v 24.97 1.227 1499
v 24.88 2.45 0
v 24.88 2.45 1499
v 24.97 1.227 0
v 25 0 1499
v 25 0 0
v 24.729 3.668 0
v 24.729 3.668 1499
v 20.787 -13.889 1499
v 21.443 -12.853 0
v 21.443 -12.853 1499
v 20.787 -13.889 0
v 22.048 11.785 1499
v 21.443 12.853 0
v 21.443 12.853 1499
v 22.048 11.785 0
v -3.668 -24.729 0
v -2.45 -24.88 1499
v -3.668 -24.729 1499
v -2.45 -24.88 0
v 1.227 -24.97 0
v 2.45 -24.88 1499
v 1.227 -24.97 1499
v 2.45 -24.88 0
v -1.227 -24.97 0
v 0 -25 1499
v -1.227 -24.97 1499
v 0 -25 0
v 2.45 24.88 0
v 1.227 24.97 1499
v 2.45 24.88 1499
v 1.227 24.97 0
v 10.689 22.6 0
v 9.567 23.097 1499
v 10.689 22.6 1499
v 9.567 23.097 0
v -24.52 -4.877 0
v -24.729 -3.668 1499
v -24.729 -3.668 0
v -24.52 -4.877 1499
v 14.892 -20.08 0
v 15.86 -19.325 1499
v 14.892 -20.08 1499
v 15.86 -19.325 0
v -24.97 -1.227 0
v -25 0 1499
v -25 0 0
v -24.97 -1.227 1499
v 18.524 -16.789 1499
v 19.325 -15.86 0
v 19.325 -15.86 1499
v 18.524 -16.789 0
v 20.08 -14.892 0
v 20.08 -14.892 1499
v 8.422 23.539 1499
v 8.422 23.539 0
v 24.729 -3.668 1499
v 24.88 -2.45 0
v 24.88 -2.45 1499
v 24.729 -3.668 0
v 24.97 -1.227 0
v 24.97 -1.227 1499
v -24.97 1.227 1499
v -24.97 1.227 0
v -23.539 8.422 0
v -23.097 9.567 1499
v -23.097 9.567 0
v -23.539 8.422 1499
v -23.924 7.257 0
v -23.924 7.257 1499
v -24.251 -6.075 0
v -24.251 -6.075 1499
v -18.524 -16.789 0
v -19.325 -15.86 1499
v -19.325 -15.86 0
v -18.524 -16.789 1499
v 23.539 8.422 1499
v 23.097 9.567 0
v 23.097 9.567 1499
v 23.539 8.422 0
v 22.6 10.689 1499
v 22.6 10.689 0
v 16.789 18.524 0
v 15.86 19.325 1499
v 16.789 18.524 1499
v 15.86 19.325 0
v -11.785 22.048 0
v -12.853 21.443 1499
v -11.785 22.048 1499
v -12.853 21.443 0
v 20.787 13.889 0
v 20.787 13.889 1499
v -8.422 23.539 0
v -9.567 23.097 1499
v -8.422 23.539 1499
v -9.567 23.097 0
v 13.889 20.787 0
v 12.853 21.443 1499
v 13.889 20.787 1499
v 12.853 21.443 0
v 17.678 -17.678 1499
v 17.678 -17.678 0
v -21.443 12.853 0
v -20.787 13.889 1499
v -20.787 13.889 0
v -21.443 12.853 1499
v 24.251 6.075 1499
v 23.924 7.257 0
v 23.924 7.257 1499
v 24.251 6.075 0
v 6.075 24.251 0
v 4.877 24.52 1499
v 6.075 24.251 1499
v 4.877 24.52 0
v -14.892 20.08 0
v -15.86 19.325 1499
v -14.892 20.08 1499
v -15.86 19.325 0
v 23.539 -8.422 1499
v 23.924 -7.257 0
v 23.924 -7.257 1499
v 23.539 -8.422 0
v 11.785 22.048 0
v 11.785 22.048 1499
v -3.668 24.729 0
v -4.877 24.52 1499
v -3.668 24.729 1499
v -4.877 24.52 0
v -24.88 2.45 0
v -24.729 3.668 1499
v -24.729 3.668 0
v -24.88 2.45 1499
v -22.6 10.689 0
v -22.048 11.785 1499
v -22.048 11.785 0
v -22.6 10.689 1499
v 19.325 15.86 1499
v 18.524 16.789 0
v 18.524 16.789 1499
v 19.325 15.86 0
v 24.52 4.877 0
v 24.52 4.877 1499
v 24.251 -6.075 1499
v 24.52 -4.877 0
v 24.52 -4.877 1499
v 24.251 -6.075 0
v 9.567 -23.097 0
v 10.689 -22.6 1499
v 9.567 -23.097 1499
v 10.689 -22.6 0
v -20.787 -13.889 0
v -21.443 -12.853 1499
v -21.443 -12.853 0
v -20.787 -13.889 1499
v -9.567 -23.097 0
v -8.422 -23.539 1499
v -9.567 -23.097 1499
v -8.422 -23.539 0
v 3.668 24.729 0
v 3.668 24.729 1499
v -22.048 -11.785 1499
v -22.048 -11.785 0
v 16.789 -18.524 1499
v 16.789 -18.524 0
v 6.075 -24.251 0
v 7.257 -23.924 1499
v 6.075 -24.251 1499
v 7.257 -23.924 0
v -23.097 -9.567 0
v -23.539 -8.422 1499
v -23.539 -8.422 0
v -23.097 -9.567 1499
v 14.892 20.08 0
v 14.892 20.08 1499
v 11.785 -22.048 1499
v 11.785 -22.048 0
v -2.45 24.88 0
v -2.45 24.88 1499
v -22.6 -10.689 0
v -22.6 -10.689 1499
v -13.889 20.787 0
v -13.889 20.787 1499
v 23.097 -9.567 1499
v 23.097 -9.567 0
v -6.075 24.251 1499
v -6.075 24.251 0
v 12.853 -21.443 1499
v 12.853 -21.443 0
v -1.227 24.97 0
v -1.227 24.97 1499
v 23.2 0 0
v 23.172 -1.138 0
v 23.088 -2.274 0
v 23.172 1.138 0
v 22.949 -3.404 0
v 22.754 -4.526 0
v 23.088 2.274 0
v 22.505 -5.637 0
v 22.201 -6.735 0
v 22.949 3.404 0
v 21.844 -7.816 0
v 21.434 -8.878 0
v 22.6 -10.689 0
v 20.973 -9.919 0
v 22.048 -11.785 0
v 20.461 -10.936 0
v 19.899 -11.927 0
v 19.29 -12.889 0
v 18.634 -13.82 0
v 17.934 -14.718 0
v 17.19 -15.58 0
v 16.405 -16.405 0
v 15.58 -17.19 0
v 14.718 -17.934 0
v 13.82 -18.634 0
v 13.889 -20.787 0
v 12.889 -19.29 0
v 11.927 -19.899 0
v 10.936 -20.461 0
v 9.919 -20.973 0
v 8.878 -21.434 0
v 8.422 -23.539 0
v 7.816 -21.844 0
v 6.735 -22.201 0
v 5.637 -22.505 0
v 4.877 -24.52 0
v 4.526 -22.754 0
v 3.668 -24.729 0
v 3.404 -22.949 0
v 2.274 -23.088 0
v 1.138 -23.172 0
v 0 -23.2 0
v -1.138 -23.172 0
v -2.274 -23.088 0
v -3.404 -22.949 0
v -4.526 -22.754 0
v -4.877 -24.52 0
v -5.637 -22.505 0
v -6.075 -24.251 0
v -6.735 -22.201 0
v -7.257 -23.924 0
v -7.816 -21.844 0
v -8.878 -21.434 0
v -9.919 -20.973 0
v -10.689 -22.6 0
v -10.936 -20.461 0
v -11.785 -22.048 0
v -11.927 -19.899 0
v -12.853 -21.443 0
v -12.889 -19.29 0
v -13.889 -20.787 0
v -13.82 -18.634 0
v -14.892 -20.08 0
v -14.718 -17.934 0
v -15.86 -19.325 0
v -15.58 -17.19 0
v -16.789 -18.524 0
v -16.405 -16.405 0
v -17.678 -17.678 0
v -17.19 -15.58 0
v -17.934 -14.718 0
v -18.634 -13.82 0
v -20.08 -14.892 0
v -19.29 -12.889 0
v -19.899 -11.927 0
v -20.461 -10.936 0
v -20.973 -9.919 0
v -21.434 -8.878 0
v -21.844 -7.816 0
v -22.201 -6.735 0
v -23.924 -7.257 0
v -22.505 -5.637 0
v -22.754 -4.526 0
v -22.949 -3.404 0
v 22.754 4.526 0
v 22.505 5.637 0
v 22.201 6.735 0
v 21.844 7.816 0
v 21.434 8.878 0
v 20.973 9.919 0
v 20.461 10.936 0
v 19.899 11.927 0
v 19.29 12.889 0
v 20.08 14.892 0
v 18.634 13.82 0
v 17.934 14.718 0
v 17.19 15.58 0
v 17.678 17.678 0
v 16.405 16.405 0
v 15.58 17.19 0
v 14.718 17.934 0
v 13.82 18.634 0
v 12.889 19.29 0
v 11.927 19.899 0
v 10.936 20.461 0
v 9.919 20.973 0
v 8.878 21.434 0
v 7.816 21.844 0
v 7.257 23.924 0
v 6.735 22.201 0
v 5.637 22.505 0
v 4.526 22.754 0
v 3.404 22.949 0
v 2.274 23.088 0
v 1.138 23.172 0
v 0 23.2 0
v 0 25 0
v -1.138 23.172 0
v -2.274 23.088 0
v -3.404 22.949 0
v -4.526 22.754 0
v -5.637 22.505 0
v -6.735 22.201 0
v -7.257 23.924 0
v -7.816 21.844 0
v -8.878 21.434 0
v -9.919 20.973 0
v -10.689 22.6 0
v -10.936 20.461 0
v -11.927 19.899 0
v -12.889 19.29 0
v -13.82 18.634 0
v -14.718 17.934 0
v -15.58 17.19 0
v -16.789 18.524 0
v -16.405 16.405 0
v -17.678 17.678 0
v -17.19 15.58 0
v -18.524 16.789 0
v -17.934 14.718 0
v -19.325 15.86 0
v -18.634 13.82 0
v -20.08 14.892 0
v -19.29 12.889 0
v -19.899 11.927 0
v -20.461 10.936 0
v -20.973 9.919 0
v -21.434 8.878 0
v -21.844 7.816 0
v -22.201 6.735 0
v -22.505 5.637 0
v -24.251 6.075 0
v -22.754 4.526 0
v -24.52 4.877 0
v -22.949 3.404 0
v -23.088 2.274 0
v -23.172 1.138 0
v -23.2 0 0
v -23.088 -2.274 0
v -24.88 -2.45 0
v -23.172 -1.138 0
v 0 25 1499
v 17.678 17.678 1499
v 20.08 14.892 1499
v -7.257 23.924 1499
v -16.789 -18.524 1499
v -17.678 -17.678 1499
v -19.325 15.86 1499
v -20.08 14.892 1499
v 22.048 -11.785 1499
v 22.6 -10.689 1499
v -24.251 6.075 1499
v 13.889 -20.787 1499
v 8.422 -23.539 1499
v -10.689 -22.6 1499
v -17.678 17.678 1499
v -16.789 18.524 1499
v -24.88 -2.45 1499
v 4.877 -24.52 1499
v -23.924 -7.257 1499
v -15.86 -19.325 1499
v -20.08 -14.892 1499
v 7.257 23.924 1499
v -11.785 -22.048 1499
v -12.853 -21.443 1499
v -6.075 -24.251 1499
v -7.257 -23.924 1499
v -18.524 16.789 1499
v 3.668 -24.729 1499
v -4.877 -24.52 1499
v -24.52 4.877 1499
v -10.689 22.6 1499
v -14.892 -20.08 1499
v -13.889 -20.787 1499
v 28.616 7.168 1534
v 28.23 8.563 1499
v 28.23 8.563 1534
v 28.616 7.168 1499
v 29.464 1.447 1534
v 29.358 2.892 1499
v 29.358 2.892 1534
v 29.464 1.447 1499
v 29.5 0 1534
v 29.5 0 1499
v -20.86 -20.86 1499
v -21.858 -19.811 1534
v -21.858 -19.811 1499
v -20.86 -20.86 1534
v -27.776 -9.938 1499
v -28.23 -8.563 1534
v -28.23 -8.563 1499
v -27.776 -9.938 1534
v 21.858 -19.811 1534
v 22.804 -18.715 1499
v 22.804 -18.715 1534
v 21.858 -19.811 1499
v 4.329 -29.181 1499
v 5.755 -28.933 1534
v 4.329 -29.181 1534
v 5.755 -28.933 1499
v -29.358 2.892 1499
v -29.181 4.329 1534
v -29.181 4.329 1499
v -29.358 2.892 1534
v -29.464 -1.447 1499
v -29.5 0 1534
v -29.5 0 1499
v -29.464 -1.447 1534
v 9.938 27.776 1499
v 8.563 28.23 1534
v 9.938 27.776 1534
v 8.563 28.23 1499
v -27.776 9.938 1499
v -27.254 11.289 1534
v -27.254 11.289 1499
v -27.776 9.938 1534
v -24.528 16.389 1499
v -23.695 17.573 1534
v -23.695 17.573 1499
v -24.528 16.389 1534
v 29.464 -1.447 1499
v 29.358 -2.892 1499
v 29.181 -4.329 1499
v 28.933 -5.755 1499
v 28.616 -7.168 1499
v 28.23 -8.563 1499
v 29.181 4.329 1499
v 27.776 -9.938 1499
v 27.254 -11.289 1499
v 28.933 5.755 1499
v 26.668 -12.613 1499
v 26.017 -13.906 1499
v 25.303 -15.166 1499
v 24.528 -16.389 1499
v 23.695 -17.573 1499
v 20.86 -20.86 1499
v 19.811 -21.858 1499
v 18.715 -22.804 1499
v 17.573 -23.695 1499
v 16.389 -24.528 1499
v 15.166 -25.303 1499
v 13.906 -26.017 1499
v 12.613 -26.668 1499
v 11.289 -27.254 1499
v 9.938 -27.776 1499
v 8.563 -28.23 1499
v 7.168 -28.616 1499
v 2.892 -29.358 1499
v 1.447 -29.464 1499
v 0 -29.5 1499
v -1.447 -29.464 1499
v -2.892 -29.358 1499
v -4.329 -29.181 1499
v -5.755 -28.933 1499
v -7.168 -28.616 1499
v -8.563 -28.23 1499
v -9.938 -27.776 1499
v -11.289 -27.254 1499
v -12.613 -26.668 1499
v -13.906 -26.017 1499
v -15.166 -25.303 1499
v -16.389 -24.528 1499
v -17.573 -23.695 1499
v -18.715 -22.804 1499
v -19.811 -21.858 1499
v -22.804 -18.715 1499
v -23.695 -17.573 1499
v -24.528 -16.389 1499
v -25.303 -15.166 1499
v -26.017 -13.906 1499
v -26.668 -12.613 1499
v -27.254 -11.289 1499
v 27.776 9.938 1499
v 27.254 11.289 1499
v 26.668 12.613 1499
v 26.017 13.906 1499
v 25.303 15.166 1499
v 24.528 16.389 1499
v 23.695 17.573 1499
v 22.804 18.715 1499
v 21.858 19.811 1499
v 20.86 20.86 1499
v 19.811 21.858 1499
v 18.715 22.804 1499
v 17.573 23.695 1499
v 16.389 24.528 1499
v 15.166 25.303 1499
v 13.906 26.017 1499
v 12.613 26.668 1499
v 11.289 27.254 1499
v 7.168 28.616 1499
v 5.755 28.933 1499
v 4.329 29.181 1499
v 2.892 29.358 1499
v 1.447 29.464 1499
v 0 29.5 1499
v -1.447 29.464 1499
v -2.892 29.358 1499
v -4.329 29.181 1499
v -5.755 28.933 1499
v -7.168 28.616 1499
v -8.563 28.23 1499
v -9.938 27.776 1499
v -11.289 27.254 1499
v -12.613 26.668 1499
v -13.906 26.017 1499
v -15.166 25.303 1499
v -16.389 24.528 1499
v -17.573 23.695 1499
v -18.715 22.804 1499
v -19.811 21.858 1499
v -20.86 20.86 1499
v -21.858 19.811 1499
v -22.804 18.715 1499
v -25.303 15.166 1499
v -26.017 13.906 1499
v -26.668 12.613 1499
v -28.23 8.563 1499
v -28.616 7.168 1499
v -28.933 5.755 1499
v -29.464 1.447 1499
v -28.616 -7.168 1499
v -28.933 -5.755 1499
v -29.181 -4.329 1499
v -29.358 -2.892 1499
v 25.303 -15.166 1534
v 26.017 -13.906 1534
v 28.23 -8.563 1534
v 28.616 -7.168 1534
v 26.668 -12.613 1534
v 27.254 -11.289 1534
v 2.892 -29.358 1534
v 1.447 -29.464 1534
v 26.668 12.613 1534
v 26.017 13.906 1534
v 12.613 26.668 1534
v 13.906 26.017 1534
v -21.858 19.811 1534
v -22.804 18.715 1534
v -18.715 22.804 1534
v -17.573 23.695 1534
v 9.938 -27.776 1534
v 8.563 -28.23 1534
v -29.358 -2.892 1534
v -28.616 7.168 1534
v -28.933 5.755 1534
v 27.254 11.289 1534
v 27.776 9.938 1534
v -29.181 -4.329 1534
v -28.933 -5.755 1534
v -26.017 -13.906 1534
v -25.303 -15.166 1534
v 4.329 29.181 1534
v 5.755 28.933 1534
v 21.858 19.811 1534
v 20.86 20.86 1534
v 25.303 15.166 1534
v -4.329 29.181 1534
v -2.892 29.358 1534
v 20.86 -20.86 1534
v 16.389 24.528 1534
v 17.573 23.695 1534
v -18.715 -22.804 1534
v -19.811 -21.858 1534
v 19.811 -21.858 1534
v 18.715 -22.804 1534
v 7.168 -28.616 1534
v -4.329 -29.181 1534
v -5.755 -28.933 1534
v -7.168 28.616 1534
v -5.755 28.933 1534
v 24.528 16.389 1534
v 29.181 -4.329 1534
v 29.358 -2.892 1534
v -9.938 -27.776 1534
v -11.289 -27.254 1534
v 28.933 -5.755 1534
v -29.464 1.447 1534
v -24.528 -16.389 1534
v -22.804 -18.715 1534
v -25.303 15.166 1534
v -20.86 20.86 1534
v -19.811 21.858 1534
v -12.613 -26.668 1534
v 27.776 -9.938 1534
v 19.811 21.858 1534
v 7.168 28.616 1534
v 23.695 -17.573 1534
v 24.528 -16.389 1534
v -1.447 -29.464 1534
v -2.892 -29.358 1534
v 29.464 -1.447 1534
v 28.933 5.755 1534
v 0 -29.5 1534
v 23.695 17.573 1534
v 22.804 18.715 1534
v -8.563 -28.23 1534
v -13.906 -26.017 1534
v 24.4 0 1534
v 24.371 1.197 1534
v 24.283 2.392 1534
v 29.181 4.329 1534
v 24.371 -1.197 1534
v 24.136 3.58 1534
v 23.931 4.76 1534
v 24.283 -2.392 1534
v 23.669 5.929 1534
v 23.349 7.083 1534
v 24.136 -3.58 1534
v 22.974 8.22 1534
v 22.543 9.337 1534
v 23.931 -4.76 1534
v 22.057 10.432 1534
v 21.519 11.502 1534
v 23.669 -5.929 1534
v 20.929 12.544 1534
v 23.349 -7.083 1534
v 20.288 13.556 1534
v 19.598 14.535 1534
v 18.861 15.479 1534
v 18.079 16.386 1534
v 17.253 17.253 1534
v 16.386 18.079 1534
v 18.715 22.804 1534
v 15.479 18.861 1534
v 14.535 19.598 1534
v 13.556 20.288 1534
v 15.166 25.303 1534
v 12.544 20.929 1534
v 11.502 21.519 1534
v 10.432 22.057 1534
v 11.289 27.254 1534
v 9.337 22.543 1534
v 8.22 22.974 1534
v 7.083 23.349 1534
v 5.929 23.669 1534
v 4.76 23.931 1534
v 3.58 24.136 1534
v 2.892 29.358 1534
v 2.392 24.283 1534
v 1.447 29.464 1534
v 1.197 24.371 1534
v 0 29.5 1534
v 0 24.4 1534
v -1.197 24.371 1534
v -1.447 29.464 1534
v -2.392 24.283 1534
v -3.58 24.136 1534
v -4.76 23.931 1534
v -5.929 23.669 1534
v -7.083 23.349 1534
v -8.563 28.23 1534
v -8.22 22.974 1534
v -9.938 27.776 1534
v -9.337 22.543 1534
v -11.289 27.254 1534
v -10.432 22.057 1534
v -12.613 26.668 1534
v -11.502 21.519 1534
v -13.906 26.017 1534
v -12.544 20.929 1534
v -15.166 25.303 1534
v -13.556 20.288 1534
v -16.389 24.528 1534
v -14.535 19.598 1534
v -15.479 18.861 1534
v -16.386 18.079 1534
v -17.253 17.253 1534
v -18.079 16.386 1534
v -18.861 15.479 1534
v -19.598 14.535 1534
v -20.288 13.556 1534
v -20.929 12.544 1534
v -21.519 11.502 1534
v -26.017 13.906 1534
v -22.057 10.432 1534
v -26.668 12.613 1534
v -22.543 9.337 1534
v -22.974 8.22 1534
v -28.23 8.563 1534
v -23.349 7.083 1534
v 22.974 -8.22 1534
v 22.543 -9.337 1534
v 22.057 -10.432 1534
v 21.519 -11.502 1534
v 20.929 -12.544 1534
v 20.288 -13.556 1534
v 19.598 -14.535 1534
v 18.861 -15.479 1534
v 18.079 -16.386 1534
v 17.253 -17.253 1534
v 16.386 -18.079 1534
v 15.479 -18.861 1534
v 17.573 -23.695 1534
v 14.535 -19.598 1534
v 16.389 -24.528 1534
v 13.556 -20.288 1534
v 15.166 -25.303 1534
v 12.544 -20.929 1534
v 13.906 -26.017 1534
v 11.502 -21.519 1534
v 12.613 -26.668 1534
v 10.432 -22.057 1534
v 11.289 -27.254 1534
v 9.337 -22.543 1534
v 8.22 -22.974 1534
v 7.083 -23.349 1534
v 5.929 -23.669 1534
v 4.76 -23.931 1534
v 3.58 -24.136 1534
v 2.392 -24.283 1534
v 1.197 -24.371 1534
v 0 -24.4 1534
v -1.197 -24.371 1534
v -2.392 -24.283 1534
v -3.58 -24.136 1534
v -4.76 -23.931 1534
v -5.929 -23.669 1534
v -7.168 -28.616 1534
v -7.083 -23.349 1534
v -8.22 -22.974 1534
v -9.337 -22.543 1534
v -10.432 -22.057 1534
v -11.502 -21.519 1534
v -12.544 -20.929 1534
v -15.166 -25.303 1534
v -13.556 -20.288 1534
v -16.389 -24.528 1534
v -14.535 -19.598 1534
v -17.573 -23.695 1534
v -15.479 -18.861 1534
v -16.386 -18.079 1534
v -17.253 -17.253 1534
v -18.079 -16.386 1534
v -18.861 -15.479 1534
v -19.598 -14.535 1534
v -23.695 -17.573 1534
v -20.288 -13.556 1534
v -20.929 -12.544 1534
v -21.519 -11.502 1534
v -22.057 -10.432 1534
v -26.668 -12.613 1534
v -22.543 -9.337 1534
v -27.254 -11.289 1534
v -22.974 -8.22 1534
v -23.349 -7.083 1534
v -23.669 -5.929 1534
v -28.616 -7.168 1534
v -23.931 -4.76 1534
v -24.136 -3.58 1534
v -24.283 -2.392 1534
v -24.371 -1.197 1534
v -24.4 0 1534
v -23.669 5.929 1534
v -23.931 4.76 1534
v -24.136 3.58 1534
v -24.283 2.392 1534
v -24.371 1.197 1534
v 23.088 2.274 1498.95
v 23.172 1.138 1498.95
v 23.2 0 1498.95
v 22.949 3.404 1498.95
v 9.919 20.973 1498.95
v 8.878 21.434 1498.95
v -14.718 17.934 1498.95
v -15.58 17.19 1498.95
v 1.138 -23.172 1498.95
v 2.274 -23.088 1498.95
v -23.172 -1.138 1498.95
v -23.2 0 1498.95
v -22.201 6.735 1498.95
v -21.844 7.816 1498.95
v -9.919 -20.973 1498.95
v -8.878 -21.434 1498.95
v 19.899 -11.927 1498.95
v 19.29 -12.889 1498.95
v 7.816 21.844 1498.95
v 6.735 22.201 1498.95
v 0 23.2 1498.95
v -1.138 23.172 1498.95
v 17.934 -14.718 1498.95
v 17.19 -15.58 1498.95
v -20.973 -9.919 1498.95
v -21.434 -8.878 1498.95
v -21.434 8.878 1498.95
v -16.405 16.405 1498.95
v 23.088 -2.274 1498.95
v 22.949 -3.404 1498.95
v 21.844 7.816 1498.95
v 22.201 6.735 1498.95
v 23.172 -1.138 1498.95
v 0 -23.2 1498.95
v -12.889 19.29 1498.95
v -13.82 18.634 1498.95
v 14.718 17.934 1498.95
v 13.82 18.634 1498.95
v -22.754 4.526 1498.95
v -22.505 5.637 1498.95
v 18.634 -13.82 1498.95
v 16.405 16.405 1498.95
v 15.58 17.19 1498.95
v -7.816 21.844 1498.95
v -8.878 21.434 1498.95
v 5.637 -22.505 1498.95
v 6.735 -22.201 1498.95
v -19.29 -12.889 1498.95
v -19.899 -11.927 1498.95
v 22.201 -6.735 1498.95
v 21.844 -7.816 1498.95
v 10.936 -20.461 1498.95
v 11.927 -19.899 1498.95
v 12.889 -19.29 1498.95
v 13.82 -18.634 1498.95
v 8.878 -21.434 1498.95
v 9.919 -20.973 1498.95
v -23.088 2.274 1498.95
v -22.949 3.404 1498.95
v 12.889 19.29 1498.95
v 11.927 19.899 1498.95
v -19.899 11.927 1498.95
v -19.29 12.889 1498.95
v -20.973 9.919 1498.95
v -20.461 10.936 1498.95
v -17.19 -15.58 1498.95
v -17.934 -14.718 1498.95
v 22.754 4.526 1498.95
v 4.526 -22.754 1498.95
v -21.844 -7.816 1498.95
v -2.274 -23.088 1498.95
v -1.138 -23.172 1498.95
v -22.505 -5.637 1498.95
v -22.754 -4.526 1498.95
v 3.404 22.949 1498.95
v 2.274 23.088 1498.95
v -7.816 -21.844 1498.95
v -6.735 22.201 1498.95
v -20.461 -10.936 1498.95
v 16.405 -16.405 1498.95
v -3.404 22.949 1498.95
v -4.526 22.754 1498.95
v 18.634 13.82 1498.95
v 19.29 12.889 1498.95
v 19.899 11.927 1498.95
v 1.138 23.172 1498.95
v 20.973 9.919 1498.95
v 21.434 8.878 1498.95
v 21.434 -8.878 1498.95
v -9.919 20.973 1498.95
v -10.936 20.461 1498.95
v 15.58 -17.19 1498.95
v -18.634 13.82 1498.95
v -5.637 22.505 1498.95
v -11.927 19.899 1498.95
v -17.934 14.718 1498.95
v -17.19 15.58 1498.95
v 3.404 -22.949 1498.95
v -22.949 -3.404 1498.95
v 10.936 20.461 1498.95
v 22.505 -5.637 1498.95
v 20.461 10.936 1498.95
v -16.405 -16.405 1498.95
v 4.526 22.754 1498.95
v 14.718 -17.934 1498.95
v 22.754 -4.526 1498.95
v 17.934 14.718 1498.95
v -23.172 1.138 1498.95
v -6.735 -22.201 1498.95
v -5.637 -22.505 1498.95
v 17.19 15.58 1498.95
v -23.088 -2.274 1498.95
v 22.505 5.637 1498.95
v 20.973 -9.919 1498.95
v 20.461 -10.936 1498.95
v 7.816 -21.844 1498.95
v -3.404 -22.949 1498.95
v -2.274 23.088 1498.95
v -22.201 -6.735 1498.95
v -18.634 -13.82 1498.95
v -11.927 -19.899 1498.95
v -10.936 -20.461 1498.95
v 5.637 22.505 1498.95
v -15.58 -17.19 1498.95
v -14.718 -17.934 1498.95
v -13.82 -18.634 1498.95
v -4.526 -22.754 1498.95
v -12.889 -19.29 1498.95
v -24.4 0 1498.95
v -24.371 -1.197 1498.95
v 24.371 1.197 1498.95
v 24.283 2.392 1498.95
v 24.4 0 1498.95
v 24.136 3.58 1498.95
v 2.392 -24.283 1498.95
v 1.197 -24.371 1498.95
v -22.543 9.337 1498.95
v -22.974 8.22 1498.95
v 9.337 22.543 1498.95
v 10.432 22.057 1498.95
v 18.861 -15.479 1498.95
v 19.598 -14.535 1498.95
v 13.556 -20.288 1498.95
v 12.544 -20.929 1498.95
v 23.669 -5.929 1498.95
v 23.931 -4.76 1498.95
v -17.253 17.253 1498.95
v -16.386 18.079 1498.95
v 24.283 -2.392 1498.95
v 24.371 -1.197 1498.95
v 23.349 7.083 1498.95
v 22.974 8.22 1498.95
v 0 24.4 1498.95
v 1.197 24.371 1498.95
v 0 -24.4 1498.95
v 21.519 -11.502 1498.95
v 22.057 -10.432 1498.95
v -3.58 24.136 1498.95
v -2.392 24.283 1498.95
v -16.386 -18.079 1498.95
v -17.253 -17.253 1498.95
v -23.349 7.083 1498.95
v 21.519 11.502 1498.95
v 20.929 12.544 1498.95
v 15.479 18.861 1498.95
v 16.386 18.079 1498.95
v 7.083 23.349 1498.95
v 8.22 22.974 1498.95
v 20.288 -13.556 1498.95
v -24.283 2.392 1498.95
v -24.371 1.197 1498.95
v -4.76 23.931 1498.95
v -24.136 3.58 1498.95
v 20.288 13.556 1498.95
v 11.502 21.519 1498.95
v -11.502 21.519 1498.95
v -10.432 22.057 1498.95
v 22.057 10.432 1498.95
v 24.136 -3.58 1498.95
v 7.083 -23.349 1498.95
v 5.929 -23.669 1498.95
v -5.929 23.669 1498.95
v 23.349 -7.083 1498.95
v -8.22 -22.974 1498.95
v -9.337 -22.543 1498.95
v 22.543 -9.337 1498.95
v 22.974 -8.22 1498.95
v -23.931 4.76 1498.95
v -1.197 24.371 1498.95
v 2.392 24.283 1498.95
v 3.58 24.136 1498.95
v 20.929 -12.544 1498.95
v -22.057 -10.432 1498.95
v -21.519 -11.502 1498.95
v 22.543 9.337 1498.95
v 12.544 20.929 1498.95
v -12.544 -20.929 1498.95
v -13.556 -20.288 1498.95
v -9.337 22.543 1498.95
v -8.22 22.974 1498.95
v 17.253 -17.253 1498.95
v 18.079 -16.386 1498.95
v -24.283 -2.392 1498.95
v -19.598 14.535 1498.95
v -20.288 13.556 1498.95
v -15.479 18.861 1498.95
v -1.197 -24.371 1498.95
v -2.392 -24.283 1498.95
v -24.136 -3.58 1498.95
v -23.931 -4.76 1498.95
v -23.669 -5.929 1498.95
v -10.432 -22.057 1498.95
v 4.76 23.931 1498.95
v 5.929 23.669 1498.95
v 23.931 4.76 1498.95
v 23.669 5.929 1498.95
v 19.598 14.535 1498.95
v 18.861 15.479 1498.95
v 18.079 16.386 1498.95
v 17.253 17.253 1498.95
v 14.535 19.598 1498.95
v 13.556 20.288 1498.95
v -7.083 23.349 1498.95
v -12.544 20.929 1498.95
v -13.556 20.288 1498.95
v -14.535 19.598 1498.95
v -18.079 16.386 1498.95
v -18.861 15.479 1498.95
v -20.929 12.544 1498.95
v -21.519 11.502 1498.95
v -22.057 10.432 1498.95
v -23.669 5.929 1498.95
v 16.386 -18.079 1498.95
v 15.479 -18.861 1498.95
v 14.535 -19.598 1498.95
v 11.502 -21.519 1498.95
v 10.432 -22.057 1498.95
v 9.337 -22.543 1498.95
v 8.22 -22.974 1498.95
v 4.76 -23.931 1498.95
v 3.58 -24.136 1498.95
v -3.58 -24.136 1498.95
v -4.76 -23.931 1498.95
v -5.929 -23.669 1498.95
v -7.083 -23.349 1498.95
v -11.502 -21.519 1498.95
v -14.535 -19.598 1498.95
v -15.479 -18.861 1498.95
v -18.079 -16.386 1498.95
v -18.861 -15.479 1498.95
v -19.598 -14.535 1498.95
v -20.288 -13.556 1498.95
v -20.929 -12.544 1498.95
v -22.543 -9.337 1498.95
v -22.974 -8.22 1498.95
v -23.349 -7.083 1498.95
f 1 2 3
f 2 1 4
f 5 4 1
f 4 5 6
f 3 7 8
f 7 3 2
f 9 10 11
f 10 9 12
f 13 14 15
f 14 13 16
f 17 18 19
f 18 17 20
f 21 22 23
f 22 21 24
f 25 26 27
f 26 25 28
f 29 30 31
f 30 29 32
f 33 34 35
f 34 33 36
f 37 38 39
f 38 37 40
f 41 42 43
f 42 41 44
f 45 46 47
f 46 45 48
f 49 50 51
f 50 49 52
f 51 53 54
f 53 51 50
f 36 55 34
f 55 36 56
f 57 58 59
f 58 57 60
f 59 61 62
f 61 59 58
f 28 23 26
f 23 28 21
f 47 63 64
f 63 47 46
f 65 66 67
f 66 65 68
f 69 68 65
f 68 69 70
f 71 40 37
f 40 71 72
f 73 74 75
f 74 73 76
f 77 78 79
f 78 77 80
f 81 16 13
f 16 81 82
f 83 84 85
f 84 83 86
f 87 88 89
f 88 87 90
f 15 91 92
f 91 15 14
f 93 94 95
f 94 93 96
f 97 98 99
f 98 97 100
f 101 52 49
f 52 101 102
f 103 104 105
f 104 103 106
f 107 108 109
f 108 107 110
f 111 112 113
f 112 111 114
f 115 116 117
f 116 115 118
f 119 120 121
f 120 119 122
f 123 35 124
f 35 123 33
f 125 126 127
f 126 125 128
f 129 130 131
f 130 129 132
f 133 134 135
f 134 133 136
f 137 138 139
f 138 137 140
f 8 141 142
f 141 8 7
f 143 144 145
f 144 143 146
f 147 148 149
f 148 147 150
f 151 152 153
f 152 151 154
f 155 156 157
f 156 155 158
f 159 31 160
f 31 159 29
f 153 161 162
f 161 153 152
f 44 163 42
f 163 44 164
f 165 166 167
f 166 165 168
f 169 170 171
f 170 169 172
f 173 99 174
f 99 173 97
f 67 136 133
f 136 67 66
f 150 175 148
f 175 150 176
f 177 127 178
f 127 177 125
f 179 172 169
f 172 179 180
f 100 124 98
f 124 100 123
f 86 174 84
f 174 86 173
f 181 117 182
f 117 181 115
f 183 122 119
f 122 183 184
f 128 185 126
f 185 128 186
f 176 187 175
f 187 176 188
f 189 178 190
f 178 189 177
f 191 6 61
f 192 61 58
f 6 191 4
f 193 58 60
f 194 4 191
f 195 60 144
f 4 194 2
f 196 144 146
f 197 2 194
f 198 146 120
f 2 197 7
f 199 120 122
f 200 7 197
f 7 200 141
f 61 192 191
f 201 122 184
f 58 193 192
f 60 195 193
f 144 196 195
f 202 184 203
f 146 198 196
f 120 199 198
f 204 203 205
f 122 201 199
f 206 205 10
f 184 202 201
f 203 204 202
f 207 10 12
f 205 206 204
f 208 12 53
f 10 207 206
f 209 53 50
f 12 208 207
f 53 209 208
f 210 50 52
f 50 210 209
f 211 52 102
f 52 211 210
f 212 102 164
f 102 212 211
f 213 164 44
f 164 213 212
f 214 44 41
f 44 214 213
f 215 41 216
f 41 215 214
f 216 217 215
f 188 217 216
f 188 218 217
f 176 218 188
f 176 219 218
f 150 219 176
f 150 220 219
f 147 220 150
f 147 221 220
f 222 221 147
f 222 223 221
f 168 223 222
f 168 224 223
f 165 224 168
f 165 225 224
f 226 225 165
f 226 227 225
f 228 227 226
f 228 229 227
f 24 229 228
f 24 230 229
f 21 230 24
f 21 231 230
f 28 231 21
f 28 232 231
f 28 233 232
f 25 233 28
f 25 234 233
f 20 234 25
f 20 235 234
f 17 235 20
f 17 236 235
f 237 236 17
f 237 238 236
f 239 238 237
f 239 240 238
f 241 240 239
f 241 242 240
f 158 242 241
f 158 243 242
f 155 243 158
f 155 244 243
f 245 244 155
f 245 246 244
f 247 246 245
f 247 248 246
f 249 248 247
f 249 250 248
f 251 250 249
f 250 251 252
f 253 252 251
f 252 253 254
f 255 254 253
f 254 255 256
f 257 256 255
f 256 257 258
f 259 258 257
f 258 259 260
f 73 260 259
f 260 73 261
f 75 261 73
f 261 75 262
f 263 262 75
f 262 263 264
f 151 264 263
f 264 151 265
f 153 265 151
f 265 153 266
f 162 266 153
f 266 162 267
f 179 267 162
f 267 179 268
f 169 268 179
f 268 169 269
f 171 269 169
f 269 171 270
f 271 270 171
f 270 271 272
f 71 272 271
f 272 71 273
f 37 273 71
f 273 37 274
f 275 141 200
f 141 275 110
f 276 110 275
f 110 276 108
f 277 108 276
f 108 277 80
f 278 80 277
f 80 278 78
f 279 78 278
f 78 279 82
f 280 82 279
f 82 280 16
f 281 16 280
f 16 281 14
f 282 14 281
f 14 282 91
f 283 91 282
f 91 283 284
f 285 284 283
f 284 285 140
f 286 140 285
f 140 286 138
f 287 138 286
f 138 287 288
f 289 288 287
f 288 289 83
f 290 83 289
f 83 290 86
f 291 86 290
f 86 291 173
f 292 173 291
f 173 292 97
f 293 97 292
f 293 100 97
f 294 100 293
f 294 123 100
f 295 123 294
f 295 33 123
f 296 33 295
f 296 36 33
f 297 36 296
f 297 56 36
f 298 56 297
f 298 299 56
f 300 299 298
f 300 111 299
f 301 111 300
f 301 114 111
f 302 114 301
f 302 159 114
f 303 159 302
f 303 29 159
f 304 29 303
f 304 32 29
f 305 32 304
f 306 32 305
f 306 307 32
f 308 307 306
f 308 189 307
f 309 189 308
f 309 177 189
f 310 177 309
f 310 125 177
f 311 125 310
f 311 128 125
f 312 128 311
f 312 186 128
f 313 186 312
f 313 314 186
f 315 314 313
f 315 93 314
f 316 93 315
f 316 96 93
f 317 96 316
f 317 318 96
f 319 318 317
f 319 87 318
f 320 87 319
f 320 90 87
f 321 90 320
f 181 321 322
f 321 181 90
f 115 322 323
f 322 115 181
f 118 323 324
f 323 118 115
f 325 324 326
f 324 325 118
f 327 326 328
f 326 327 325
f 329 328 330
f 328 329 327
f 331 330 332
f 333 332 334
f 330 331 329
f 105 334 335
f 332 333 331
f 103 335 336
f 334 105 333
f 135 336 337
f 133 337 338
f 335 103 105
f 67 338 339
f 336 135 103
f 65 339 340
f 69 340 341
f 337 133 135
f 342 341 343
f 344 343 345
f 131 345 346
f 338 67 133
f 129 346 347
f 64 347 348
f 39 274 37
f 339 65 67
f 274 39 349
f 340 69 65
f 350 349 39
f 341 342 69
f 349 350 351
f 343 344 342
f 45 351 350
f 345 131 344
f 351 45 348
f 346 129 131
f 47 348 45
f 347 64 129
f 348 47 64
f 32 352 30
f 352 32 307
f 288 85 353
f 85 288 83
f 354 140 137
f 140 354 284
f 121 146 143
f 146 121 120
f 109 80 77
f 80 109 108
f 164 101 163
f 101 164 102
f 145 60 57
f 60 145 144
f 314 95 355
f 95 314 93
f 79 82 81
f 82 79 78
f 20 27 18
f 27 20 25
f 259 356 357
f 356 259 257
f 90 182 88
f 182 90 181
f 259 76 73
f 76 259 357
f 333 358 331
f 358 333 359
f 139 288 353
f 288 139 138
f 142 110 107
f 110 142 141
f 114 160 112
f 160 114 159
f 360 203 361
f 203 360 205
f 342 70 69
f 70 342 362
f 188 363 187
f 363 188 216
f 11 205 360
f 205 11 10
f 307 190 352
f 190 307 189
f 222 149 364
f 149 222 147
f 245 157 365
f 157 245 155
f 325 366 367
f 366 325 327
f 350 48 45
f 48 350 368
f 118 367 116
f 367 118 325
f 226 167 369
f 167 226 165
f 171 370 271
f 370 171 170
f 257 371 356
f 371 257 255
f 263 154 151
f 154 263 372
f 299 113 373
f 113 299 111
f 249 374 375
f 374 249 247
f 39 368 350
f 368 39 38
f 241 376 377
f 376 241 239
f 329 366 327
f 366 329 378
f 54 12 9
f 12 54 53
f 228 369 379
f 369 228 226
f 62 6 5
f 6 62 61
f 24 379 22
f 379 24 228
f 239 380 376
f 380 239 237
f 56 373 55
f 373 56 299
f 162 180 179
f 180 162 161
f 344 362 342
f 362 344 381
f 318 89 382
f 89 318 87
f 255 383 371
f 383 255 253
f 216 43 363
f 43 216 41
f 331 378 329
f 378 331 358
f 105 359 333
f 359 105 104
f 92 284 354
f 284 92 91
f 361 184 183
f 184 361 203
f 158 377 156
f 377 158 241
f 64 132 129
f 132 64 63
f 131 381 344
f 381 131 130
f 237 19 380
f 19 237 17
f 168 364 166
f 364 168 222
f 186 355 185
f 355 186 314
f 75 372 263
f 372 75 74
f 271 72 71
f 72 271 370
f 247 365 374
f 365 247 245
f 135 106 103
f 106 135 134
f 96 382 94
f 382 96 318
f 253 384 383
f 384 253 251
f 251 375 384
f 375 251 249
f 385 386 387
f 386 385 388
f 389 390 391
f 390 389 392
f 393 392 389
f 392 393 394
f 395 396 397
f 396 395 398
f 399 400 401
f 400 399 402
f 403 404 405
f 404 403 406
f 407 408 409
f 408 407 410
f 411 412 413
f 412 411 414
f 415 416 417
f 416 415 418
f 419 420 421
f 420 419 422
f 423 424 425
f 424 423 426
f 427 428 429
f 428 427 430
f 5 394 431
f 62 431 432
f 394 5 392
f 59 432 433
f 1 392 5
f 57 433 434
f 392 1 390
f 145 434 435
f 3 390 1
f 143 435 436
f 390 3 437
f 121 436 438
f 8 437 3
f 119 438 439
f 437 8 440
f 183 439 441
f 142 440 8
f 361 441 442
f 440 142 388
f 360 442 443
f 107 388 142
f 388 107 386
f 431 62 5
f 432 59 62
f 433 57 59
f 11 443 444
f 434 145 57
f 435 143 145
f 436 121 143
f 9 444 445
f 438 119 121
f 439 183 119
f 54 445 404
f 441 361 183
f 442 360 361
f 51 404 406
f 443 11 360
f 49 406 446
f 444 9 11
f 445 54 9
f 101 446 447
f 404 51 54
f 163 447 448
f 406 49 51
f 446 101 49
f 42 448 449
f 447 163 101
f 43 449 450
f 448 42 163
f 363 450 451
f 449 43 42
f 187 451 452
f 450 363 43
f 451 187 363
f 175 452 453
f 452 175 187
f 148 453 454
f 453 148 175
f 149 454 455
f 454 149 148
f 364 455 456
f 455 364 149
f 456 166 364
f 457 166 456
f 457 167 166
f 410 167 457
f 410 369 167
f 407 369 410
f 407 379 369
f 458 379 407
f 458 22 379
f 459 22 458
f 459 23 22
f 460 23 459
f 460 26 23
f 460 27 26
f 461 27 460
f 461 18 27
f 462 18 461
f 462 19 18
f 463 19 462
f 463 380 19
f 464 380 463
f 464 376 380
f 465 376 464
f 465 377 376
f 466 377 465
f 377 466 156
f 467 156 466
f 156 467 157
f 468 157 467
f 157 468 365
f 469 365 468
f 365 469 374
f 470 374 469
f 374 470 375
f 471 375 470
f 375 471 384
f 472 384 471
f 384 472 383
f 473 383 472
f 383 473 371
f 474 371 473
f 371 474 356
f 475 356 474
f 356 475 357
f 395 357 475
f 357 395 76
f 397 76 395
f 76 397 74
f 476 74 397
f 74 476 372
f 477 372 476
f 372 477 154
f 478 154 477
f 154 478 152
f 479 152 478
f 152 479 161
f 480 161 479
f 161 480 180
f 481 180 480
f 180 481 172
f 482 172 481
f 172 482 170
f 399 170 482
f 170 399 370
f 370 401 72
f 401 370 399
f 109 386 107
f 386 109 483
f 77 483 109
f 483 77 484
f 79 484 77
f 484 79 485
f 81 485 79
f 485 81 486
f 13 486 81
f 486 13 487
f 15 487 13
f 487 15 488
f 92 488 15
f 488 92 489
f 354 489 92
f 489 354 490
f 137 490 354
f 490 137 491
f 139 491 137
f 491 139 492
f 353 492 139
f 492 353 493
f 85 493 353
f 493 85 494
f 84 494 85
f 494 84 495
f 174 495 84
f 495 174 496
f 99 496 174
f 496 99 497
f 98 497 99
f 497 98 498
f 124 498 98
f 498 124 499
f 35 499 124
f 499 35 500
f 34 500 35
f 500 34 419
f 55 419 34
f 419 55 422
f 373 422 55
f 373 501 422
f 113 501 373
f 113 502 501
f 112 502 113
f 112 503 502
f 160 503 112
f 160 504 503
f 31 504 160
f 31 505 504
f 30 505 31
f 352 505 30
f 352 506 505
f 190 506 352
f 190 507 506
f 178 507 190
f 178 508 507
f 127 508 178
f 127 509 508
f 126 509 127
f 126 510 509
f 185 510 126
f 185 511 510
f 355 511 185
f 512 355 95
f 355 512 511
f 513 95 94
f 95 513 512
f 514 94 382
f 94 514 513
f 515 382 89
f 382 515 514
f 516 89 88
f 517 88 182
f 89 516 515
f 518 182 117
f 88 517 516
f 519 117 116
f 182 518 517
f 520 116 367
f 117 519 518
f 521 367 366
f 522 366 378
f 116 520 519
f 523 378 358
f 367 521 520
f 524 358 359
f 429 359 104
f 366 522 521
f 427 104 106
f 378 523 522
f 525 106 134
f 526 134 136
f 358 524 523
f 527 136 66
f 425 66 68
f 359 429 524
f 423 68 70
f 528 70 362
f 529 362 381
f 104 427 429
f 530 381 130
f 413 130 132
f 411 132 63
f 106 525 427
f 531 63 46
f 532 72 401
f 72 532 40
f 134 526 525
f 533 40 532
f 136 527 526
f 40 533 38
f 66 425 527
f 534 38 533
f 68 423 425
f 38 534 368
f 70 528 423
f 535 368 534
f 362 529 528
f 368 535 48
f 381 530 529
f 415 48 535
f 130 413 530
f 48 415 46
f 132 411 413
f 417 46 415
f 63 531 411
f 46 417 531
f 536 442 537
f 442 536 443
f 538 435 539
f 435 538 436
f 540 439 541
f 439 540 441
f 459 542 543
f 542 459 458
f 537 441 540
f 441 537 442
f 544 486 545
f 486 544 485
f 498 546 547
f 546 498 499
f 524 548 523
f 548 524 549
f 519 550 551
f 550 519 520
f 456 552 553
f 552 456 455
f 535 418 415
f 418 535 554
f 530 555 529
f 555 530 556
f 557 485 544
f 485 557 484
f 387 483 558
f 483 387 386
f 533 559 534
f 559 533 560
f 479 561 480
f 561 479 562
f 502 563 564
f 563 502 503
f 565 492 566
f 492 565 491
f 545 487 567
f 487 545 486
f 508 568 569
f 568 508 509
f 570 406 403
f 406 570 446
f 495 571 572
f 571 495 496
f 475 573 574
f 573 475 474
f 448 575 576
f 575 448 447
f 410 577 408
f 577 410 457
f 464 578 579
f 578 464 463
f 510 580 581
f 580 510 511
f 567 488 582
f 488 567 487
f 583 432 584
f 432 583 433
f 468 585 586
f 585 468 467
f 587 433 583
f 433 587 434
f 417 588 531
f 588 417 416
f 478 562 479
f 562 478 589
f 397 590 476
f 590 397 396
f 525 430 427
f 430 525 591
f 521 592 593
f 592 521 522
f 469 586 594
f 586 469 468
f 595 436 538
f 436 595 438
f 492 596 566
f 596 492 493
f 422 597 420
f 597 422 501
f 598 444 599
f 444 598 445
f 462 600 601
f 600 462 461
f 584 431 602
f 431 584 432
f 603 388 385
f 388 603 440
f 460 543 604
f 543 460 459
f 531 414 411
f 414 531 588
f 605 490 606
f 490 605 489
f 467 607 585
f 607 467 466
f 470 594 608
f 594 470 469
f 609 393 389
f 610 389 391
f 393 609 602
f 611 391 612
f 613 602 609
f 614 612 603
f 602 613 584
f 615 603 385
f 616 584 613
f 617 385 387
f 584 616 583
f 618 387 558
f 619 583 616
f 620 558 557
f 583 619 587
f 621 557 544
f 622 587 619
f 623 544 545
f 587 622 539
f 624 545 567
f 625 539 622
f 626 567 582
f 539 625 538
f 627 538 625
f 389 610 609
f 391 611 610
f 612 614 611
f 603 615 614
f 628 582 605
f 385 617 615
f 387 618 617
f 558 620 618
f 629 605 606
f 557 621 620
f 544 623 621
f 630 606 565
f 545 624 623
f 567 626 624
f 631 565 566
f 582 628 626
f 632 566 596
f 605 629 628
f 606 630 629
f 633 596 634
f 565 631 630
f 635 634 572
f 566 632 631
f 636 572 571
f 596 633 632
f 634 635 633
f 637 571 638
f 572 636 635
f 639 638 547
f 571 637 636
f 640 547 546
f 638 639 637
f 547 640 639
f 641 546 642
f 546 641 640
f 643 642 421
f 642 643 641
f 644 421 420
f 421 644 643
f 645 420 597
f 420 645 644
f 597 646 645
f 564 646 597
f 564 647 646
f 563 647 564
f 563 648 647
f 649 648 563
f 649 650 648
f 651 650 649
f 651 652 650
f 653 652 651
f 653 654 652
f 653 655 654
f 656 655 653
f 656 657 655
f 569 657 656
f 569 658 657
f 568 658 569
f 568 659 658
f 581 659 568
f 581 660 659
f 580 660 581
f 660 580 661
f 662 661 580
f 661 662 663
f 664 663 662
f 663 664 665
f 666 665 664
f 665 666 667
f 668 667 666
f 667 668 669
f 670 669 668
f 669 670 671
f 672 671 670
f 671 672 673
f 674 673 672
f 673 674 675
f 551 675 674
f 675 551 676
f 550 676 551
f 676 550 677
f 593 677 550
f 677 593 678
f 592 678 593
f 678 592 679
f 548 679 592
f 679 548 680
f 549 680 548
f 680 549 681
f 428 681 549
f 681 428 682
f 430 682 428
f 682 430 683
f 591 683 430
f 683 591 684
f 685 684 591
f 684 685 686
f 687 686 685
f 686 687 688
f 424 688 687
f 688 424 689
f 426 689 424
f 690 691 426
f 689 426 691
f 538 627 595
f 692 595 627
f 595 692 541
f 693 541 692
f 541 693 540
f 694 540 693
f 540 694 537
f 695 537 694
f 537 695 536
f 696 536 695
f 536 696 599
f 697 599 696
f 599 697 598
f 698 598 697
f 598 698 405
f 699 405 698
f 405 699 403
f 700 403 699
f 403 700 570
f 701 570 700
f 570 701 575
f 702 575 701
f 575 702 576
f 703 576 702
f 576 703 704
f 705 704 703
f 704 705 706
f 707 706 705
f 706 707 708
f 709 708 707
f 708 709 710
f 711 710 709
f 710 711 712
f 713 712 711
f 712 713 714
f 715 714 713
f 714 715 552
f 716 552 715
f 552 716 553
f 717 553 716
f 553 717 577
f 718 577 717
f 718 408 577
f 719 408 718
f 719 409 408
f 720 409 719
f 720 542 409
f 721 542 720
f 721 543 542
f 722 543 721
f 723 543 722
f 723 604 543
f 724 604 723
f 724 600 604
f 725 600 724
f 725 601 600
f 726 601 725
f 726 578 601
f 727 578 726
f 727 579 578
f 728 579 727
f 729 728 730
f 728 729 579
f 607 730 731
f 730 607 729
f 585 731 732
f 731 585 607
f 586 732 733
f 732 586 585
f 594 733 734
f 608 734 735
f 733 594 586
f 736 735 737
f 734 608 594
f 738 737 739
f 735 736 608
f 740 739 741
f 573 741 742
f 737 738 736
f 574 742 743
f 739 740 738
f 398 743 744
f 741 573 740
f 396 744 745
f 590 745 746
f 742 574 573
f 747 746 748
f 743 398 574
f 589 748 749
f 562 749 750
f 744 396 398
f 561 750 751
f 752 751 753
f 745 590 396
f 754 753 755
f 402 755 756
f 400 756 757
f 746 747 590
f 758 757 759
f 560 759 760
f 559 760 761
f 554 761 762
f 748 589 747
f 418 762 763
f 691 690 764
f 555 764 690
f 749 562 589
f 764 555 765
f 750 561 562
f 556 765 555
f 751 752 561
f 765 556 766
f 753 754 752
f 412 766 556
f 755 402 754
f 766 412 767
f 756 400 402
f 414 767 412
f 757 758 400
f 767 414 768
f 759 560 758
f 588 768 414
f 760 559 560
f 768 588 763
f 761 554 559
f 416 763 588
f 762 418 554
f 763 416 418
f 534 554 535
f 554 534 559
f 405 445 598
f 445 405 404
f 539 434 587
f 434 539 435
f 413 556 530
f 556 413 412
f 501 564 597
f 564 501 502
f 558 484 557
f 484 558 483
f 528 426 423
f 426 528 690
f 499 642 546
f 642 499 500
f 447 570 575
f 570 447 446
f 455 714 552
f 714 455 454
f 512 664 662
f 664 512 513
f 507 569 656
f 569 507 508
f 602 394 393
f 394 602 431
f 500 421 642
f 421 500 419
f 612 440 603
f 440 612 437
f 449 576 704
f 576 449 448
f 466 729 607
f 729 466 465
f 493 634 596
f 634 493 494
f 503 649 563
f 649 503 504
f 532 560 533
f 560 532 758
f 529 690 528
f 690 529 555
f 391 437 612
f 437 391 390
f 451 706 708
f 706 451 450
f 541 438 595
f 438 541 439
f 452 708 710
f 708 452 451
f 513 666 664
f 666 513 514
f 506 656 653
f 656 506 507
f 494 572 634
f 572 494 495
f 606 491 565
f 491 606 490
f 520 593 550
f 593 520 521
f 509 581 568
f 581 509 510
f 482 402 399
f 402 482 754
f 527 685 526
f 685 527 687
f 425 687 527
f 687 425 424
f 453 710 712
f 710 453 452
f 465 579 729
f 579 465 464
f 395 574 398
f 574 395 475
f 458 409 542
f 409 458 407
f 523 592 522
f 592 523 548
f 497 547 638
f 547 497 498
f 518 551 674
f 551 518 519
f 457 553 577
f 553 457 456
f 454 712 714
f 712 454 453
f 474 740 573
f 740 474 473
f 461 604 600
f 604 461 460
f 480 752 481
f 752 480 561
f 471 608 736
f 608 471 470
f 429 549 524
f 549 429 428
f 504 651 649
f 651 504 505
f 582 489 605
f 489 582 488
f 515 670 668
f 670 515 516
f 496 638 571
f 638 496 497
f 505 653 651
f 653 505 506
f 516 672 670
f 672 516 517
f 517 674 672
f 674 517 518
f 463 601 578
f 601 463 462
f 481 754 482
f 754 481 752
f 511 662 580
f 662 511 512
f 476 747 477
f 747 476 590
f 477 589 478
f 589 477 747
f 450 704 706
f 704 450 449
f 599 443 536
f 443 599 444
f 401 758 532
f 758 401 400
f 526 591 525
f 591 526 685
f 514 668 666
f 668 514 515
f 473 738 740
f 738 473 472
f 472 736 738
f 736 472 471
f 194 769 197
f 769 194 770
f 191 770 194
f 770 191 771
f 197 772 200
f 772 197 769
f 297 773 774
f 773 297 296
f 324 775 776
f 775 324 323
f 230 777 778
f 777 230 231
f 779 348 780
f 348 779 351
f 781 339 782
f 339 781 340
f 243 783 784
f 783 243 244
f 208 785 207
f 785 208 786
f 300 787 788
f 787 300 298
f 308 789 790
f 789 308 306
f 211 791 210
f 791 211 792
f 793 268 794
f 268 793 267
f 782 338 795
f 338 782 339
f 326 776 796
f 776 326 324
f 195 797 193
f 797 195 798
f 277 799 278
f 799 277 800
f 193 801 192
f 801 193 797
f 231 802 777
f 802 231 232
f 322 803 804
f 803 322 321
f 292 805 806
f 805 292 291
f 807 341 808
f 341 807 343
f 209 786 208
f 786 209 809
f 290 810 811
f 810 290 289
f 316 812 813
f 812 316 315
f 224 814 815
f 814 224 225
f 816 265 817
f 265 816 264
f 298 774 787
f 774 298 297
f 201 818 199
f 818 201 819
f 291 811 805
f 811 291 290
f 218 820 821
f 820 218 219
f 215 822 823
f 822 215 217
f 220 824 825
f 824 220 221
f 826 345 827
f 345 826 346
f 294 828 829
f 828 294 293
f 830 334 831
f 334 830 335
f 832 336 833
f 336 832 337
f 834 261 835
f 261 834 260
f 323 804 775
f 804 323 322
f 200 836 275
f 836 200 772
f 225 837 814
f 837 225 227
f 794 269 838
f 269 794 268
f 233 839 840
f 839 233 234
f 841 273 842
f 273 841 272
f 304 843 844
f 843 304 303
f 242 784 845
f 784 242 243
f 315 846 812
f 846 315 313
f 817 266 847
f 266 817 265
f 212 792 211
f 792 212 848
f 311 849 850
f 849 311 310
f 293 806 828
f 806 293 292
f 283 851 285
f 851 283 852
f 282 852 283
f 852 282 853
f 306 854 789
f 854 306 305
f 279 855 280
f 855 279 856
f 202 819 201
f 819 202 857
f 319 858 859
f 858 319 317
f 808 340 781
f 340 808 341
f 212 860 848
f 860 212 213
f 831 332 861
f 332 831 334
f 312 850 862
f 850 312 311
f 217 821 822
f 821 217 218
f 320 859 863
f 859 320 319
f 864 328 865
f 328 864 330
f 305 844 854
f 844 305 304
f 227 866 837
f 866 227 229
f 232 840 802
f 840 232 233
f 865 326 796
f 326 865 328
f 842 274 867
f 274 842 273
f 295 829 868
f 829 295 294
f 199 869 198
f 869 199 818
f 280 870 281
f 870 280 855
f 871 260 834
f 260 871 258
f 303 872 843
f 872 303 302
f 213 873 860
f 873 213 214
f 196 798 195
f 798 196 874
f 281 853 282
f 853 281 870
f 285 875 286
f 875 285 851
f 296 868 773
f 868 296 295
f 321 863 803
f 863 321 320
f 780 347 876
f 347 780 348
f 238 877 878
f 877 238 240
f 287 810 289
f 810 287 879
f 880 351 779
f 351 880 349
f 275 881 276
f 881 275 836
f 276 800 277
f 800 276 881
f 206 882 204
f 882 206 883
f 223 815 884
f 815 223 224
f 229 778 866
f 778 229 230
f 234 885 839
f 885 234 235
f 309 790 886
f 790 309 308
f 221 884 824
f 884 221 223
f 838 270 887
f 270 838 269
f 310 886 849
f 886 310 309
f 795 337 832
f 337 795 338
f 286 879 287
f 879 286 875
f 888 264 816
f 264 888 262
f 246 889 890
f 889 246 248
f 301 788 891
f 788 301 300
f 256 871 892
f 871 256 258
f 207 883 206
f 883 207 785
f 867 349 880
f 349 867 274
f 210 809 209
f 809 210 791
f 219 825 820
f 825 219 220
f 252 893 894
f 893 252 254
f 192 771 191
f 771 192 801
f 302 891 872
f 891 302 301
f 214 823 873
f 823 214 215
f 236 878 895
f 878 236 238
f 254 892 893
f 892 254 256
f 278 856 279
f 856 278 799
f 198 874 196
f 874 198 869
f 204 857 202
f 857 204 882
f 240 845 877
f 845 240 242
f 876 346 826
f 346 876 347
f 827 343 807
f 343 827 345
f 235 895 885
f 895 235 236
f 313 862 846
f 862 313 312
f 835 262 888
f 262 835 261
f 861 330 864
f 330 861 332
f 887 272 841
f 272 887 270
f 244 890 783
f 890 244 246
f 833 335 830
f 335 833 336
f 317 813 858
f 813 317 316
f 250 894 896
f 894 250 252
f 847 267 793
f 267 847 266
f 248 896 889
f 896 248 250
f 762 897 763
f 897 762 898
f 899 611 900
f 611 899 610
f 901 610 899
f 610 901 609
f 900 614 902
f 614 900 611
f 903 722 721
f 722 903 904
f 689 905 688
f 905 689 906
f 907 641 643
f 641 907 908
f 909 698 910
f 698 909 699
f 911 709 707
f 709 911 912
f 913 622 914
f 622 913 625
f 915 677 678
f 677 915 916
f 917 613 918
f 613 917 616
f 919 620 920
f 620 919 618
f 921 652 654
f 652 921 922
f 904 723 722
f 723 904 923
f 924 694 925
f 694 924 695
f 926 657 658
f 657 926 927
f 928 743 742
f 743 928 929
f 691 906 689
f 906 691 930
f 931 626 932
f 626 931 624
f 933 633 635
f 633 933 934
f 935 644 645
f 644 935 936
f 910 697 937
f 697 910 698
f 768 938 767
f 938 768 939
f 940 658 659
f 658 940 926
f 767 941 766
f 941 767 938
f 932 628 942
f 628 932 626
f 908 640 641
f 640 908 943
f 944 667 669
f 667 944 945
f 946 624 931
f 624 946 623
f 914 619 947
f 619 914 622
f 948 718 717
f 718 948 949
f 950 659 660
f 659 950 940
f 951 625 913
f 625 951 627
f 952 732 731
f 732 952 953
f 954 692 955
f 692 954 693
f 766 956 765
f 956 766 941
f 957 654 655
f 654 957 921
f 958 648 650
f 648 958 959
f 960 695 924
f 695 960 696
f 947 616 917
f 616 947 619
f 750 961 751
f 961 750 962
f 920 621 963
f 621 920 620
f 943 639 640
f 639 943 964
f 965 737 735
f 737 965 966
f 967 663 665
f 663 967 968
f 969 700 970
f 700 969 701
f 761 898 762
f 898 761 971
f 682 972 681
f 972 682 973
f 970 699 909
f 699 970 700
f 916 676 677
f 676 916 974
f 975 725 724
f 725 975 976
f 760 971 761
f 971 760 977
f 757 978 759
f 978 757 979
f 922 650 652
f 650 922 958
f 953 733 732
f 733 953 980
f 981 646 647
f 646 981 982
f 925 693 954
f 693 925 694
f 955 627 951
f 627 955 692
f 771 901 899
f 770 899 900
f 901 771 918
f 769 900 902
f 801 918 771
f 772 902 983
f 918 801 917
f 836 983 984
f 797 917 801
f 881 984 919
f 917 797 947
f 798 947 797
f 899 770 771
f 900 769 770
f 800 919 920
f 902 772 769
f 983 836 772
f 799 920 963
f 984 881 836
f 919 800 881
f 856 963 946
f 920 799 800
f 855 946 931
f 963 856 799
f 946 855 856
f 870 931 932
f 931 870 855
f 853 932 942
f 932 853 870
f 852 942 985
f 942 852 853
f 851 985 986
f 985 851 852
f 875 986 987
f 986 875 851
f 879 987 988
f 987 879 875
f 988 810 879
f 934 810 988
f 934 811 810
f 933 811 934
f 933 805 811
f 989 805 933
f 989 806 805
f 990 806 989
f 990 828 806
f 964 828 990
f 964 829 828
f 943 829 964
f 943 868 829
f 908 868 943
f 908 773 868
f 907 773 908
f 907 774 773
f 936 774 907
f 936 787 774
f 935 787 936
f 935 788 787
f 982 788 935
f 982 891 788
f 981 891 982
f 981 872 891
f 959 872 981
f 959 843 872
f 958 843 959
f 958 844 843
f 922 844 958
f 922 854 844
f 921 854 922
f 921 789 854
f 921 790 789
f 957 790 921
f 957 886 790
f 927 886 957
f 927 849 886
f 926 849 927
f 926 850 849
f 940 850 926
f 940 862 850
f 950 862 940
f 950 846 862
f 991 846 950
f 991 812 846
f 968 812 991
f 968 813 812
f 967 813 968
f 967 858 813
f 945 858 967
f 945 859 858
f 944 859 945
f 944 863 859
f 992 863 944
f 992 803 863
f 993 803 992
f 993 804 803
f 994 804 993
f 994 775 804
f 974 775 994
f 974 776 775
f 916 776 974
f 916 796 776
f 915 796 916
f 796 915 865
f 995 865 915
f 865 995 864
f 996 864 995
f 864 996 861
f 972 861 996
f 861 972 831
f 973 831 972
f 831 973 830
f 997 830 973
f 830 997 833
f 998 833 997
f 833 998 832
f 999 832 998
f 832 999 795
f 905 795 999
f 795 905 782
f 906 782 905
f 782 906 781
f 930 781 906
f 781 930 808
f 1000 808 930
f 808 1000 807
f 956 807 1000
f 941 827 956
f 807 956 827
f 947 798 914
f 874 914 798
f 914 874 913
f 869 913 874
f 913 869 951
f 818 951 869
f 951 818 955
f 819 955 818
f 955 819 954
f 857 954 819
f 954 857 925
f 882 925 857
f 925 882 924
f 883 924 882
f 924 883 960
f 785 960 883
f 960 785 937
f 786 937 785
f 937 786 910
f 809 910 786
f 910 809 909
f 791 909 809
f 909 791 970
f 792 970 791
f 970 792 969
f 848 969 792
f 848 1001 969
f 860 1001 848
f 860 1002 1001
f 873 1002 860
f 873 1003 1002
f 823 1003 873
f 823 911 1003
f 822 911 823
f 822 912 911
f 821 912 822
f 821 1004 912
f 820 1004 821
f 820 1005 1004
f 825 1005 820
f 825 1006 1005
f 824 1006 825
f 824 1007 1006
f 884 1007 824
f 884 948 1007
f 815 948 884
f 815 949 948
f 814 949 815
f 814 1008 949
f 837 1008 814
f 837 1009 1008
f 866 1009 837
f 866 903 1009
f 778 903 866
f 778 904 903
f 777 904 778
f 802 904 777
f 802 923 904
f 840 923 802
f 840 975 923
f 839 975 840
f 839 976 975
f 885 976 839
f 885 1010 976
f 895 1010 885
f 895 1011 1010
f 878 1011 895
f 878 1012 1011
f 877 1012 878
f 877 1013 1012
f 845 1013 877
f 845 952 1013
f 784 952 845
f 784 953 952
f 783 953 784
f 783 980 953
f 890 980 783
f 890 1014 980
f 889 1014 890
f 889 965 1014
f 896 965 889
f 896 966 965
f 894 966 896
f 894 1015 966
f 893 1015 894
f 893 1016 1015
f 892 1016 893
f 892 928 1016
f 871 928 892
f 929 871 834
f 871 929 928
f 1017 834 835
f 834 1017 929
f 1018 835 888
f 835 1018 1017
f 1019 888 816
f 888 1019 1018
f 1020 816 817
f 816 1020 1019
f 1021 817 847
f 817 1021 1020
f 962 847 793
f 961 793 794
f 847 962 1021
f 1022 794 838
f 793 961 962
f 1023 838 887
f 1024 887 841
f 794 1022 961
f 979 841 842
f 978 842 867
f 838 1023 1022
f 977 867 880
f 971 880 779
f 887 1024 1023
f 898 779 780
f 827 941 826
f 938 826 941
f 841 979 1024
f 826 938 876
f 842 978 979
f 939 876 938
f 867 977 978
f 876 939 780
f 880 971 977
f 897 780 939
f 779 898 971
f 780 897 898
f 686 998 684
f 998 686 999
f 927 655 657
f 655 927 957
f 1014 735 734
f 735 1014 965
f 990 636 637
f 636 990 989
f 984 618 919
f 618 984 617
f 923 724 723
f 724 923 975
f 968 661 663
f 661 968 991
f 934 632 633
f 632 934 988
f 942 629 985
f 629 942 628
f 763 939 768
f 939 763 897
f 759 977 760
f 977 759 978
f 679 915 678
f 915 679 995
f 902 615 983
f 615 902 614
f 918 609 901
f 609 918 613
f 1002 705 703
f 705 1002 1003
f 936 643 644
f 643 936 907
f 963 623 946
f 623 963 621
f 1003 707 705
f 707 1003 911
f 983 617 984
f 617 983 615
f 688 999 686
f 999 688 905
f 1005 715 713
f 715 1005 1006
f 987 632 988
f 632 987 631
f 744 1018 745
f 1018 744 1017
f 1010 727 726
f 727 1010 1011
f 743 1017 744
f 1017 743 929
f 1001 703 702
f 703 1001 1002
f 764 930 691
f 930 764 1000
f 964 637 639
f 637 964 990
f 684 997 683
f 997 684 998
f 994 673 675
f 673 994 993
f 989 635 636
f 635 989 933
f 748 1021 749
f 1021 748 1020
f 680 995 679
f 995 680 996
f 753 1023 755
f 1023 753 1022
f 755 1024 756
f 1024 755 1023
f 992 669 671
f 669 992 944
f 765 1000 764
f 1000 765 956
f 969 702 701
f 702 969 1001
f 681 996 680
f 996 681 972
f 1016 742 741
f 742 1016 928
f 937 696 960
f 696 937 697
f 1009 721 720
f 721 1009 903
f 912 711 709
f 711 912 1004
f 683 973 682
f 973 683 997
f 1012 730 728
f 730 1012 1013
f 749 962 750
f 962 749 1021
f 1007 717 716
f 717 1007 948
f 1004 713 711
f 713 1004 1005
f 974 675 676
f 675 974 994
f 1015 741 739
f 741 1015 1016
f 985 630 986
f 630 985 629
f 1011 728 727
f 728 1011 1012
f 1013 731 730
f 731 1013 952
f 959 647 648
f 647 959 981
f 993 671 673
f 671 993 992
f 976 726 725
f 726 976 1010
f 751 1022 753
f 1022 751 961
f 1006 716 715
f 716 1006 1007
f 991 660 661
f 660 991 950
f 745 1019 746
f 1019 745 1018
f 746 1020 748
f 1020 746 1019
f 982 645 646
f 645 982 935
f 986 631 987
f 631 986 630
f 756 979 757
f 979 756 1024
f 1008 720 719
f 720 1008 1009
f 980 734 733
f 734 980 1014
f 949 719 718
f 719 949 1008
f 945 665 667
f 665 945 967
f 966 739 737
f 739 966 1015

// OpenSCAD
// HT 50 pipe 1500 mm (single connected solid)

// Parameters
nominal_size_label = 50; //[25:110:1]
length_mm = 1500;        //[750:3000:10]
pipe_od = 50;            //[25:110:1]
pipe_wall = 1.8;         //[0.9:3.6:0.1]
fitting_length = 35;     //[18:70:1]
fitting_od_scale = 1.18; //[1.05:1.4:0.01]
fitting_wall_extra = 1.2;//[0.5:3:0.1]
overlap = 1;             //[0.5:2:0.1]

$fn = 128;

// Derived radii (clamped for robustness)
pipe_or = pipe_od/2;
pipe_ir = max(0.01, pipe_or - pipe_wall);

fitting_or = (pipe_od * fitting_od_scale)/2;
fitting_ir = max(0.01, pipe_ir + fitting_wall_extra);

// Ensure fitting inner radius never exceeds its outer radius
fitting_ir2 = min(fitting_ir, fitting_or - 0.2);

// Small epsilon to avoid coplanar faces in boolean ops
eps = 0.05;

module ht_pipe() {
  color([0.85, 0.85, 0.8])
  difference() {
    // OUTER: main pipe + socket (overlapped so it's one connected solid)
    union() {
      cylinder(h=length_mm, r=pipe_or, center=false);
      translate([0, 0, length_mm - overlap])
        cylinder(h=fitting_length, r=fitting_or, center=false);
    }

    // INNER VOID: through-bore + enlarged socket bore
    union() {
      // Through bore (slightly extended to guarantee clean subtraction)
      translate([0, 0, -eps])
        cylinder(h=length_mm + 2*eps, r=pipe_ir, center=false);

      // Socket bore (slightly extended and aligned with socket)
      translate([0, 0, length_mm - overlap - eps])
        cylinder(h=fitting_length + 2*eps, r=fitting_ir2, center=false);
    }
  }
}

ht_pipe();
